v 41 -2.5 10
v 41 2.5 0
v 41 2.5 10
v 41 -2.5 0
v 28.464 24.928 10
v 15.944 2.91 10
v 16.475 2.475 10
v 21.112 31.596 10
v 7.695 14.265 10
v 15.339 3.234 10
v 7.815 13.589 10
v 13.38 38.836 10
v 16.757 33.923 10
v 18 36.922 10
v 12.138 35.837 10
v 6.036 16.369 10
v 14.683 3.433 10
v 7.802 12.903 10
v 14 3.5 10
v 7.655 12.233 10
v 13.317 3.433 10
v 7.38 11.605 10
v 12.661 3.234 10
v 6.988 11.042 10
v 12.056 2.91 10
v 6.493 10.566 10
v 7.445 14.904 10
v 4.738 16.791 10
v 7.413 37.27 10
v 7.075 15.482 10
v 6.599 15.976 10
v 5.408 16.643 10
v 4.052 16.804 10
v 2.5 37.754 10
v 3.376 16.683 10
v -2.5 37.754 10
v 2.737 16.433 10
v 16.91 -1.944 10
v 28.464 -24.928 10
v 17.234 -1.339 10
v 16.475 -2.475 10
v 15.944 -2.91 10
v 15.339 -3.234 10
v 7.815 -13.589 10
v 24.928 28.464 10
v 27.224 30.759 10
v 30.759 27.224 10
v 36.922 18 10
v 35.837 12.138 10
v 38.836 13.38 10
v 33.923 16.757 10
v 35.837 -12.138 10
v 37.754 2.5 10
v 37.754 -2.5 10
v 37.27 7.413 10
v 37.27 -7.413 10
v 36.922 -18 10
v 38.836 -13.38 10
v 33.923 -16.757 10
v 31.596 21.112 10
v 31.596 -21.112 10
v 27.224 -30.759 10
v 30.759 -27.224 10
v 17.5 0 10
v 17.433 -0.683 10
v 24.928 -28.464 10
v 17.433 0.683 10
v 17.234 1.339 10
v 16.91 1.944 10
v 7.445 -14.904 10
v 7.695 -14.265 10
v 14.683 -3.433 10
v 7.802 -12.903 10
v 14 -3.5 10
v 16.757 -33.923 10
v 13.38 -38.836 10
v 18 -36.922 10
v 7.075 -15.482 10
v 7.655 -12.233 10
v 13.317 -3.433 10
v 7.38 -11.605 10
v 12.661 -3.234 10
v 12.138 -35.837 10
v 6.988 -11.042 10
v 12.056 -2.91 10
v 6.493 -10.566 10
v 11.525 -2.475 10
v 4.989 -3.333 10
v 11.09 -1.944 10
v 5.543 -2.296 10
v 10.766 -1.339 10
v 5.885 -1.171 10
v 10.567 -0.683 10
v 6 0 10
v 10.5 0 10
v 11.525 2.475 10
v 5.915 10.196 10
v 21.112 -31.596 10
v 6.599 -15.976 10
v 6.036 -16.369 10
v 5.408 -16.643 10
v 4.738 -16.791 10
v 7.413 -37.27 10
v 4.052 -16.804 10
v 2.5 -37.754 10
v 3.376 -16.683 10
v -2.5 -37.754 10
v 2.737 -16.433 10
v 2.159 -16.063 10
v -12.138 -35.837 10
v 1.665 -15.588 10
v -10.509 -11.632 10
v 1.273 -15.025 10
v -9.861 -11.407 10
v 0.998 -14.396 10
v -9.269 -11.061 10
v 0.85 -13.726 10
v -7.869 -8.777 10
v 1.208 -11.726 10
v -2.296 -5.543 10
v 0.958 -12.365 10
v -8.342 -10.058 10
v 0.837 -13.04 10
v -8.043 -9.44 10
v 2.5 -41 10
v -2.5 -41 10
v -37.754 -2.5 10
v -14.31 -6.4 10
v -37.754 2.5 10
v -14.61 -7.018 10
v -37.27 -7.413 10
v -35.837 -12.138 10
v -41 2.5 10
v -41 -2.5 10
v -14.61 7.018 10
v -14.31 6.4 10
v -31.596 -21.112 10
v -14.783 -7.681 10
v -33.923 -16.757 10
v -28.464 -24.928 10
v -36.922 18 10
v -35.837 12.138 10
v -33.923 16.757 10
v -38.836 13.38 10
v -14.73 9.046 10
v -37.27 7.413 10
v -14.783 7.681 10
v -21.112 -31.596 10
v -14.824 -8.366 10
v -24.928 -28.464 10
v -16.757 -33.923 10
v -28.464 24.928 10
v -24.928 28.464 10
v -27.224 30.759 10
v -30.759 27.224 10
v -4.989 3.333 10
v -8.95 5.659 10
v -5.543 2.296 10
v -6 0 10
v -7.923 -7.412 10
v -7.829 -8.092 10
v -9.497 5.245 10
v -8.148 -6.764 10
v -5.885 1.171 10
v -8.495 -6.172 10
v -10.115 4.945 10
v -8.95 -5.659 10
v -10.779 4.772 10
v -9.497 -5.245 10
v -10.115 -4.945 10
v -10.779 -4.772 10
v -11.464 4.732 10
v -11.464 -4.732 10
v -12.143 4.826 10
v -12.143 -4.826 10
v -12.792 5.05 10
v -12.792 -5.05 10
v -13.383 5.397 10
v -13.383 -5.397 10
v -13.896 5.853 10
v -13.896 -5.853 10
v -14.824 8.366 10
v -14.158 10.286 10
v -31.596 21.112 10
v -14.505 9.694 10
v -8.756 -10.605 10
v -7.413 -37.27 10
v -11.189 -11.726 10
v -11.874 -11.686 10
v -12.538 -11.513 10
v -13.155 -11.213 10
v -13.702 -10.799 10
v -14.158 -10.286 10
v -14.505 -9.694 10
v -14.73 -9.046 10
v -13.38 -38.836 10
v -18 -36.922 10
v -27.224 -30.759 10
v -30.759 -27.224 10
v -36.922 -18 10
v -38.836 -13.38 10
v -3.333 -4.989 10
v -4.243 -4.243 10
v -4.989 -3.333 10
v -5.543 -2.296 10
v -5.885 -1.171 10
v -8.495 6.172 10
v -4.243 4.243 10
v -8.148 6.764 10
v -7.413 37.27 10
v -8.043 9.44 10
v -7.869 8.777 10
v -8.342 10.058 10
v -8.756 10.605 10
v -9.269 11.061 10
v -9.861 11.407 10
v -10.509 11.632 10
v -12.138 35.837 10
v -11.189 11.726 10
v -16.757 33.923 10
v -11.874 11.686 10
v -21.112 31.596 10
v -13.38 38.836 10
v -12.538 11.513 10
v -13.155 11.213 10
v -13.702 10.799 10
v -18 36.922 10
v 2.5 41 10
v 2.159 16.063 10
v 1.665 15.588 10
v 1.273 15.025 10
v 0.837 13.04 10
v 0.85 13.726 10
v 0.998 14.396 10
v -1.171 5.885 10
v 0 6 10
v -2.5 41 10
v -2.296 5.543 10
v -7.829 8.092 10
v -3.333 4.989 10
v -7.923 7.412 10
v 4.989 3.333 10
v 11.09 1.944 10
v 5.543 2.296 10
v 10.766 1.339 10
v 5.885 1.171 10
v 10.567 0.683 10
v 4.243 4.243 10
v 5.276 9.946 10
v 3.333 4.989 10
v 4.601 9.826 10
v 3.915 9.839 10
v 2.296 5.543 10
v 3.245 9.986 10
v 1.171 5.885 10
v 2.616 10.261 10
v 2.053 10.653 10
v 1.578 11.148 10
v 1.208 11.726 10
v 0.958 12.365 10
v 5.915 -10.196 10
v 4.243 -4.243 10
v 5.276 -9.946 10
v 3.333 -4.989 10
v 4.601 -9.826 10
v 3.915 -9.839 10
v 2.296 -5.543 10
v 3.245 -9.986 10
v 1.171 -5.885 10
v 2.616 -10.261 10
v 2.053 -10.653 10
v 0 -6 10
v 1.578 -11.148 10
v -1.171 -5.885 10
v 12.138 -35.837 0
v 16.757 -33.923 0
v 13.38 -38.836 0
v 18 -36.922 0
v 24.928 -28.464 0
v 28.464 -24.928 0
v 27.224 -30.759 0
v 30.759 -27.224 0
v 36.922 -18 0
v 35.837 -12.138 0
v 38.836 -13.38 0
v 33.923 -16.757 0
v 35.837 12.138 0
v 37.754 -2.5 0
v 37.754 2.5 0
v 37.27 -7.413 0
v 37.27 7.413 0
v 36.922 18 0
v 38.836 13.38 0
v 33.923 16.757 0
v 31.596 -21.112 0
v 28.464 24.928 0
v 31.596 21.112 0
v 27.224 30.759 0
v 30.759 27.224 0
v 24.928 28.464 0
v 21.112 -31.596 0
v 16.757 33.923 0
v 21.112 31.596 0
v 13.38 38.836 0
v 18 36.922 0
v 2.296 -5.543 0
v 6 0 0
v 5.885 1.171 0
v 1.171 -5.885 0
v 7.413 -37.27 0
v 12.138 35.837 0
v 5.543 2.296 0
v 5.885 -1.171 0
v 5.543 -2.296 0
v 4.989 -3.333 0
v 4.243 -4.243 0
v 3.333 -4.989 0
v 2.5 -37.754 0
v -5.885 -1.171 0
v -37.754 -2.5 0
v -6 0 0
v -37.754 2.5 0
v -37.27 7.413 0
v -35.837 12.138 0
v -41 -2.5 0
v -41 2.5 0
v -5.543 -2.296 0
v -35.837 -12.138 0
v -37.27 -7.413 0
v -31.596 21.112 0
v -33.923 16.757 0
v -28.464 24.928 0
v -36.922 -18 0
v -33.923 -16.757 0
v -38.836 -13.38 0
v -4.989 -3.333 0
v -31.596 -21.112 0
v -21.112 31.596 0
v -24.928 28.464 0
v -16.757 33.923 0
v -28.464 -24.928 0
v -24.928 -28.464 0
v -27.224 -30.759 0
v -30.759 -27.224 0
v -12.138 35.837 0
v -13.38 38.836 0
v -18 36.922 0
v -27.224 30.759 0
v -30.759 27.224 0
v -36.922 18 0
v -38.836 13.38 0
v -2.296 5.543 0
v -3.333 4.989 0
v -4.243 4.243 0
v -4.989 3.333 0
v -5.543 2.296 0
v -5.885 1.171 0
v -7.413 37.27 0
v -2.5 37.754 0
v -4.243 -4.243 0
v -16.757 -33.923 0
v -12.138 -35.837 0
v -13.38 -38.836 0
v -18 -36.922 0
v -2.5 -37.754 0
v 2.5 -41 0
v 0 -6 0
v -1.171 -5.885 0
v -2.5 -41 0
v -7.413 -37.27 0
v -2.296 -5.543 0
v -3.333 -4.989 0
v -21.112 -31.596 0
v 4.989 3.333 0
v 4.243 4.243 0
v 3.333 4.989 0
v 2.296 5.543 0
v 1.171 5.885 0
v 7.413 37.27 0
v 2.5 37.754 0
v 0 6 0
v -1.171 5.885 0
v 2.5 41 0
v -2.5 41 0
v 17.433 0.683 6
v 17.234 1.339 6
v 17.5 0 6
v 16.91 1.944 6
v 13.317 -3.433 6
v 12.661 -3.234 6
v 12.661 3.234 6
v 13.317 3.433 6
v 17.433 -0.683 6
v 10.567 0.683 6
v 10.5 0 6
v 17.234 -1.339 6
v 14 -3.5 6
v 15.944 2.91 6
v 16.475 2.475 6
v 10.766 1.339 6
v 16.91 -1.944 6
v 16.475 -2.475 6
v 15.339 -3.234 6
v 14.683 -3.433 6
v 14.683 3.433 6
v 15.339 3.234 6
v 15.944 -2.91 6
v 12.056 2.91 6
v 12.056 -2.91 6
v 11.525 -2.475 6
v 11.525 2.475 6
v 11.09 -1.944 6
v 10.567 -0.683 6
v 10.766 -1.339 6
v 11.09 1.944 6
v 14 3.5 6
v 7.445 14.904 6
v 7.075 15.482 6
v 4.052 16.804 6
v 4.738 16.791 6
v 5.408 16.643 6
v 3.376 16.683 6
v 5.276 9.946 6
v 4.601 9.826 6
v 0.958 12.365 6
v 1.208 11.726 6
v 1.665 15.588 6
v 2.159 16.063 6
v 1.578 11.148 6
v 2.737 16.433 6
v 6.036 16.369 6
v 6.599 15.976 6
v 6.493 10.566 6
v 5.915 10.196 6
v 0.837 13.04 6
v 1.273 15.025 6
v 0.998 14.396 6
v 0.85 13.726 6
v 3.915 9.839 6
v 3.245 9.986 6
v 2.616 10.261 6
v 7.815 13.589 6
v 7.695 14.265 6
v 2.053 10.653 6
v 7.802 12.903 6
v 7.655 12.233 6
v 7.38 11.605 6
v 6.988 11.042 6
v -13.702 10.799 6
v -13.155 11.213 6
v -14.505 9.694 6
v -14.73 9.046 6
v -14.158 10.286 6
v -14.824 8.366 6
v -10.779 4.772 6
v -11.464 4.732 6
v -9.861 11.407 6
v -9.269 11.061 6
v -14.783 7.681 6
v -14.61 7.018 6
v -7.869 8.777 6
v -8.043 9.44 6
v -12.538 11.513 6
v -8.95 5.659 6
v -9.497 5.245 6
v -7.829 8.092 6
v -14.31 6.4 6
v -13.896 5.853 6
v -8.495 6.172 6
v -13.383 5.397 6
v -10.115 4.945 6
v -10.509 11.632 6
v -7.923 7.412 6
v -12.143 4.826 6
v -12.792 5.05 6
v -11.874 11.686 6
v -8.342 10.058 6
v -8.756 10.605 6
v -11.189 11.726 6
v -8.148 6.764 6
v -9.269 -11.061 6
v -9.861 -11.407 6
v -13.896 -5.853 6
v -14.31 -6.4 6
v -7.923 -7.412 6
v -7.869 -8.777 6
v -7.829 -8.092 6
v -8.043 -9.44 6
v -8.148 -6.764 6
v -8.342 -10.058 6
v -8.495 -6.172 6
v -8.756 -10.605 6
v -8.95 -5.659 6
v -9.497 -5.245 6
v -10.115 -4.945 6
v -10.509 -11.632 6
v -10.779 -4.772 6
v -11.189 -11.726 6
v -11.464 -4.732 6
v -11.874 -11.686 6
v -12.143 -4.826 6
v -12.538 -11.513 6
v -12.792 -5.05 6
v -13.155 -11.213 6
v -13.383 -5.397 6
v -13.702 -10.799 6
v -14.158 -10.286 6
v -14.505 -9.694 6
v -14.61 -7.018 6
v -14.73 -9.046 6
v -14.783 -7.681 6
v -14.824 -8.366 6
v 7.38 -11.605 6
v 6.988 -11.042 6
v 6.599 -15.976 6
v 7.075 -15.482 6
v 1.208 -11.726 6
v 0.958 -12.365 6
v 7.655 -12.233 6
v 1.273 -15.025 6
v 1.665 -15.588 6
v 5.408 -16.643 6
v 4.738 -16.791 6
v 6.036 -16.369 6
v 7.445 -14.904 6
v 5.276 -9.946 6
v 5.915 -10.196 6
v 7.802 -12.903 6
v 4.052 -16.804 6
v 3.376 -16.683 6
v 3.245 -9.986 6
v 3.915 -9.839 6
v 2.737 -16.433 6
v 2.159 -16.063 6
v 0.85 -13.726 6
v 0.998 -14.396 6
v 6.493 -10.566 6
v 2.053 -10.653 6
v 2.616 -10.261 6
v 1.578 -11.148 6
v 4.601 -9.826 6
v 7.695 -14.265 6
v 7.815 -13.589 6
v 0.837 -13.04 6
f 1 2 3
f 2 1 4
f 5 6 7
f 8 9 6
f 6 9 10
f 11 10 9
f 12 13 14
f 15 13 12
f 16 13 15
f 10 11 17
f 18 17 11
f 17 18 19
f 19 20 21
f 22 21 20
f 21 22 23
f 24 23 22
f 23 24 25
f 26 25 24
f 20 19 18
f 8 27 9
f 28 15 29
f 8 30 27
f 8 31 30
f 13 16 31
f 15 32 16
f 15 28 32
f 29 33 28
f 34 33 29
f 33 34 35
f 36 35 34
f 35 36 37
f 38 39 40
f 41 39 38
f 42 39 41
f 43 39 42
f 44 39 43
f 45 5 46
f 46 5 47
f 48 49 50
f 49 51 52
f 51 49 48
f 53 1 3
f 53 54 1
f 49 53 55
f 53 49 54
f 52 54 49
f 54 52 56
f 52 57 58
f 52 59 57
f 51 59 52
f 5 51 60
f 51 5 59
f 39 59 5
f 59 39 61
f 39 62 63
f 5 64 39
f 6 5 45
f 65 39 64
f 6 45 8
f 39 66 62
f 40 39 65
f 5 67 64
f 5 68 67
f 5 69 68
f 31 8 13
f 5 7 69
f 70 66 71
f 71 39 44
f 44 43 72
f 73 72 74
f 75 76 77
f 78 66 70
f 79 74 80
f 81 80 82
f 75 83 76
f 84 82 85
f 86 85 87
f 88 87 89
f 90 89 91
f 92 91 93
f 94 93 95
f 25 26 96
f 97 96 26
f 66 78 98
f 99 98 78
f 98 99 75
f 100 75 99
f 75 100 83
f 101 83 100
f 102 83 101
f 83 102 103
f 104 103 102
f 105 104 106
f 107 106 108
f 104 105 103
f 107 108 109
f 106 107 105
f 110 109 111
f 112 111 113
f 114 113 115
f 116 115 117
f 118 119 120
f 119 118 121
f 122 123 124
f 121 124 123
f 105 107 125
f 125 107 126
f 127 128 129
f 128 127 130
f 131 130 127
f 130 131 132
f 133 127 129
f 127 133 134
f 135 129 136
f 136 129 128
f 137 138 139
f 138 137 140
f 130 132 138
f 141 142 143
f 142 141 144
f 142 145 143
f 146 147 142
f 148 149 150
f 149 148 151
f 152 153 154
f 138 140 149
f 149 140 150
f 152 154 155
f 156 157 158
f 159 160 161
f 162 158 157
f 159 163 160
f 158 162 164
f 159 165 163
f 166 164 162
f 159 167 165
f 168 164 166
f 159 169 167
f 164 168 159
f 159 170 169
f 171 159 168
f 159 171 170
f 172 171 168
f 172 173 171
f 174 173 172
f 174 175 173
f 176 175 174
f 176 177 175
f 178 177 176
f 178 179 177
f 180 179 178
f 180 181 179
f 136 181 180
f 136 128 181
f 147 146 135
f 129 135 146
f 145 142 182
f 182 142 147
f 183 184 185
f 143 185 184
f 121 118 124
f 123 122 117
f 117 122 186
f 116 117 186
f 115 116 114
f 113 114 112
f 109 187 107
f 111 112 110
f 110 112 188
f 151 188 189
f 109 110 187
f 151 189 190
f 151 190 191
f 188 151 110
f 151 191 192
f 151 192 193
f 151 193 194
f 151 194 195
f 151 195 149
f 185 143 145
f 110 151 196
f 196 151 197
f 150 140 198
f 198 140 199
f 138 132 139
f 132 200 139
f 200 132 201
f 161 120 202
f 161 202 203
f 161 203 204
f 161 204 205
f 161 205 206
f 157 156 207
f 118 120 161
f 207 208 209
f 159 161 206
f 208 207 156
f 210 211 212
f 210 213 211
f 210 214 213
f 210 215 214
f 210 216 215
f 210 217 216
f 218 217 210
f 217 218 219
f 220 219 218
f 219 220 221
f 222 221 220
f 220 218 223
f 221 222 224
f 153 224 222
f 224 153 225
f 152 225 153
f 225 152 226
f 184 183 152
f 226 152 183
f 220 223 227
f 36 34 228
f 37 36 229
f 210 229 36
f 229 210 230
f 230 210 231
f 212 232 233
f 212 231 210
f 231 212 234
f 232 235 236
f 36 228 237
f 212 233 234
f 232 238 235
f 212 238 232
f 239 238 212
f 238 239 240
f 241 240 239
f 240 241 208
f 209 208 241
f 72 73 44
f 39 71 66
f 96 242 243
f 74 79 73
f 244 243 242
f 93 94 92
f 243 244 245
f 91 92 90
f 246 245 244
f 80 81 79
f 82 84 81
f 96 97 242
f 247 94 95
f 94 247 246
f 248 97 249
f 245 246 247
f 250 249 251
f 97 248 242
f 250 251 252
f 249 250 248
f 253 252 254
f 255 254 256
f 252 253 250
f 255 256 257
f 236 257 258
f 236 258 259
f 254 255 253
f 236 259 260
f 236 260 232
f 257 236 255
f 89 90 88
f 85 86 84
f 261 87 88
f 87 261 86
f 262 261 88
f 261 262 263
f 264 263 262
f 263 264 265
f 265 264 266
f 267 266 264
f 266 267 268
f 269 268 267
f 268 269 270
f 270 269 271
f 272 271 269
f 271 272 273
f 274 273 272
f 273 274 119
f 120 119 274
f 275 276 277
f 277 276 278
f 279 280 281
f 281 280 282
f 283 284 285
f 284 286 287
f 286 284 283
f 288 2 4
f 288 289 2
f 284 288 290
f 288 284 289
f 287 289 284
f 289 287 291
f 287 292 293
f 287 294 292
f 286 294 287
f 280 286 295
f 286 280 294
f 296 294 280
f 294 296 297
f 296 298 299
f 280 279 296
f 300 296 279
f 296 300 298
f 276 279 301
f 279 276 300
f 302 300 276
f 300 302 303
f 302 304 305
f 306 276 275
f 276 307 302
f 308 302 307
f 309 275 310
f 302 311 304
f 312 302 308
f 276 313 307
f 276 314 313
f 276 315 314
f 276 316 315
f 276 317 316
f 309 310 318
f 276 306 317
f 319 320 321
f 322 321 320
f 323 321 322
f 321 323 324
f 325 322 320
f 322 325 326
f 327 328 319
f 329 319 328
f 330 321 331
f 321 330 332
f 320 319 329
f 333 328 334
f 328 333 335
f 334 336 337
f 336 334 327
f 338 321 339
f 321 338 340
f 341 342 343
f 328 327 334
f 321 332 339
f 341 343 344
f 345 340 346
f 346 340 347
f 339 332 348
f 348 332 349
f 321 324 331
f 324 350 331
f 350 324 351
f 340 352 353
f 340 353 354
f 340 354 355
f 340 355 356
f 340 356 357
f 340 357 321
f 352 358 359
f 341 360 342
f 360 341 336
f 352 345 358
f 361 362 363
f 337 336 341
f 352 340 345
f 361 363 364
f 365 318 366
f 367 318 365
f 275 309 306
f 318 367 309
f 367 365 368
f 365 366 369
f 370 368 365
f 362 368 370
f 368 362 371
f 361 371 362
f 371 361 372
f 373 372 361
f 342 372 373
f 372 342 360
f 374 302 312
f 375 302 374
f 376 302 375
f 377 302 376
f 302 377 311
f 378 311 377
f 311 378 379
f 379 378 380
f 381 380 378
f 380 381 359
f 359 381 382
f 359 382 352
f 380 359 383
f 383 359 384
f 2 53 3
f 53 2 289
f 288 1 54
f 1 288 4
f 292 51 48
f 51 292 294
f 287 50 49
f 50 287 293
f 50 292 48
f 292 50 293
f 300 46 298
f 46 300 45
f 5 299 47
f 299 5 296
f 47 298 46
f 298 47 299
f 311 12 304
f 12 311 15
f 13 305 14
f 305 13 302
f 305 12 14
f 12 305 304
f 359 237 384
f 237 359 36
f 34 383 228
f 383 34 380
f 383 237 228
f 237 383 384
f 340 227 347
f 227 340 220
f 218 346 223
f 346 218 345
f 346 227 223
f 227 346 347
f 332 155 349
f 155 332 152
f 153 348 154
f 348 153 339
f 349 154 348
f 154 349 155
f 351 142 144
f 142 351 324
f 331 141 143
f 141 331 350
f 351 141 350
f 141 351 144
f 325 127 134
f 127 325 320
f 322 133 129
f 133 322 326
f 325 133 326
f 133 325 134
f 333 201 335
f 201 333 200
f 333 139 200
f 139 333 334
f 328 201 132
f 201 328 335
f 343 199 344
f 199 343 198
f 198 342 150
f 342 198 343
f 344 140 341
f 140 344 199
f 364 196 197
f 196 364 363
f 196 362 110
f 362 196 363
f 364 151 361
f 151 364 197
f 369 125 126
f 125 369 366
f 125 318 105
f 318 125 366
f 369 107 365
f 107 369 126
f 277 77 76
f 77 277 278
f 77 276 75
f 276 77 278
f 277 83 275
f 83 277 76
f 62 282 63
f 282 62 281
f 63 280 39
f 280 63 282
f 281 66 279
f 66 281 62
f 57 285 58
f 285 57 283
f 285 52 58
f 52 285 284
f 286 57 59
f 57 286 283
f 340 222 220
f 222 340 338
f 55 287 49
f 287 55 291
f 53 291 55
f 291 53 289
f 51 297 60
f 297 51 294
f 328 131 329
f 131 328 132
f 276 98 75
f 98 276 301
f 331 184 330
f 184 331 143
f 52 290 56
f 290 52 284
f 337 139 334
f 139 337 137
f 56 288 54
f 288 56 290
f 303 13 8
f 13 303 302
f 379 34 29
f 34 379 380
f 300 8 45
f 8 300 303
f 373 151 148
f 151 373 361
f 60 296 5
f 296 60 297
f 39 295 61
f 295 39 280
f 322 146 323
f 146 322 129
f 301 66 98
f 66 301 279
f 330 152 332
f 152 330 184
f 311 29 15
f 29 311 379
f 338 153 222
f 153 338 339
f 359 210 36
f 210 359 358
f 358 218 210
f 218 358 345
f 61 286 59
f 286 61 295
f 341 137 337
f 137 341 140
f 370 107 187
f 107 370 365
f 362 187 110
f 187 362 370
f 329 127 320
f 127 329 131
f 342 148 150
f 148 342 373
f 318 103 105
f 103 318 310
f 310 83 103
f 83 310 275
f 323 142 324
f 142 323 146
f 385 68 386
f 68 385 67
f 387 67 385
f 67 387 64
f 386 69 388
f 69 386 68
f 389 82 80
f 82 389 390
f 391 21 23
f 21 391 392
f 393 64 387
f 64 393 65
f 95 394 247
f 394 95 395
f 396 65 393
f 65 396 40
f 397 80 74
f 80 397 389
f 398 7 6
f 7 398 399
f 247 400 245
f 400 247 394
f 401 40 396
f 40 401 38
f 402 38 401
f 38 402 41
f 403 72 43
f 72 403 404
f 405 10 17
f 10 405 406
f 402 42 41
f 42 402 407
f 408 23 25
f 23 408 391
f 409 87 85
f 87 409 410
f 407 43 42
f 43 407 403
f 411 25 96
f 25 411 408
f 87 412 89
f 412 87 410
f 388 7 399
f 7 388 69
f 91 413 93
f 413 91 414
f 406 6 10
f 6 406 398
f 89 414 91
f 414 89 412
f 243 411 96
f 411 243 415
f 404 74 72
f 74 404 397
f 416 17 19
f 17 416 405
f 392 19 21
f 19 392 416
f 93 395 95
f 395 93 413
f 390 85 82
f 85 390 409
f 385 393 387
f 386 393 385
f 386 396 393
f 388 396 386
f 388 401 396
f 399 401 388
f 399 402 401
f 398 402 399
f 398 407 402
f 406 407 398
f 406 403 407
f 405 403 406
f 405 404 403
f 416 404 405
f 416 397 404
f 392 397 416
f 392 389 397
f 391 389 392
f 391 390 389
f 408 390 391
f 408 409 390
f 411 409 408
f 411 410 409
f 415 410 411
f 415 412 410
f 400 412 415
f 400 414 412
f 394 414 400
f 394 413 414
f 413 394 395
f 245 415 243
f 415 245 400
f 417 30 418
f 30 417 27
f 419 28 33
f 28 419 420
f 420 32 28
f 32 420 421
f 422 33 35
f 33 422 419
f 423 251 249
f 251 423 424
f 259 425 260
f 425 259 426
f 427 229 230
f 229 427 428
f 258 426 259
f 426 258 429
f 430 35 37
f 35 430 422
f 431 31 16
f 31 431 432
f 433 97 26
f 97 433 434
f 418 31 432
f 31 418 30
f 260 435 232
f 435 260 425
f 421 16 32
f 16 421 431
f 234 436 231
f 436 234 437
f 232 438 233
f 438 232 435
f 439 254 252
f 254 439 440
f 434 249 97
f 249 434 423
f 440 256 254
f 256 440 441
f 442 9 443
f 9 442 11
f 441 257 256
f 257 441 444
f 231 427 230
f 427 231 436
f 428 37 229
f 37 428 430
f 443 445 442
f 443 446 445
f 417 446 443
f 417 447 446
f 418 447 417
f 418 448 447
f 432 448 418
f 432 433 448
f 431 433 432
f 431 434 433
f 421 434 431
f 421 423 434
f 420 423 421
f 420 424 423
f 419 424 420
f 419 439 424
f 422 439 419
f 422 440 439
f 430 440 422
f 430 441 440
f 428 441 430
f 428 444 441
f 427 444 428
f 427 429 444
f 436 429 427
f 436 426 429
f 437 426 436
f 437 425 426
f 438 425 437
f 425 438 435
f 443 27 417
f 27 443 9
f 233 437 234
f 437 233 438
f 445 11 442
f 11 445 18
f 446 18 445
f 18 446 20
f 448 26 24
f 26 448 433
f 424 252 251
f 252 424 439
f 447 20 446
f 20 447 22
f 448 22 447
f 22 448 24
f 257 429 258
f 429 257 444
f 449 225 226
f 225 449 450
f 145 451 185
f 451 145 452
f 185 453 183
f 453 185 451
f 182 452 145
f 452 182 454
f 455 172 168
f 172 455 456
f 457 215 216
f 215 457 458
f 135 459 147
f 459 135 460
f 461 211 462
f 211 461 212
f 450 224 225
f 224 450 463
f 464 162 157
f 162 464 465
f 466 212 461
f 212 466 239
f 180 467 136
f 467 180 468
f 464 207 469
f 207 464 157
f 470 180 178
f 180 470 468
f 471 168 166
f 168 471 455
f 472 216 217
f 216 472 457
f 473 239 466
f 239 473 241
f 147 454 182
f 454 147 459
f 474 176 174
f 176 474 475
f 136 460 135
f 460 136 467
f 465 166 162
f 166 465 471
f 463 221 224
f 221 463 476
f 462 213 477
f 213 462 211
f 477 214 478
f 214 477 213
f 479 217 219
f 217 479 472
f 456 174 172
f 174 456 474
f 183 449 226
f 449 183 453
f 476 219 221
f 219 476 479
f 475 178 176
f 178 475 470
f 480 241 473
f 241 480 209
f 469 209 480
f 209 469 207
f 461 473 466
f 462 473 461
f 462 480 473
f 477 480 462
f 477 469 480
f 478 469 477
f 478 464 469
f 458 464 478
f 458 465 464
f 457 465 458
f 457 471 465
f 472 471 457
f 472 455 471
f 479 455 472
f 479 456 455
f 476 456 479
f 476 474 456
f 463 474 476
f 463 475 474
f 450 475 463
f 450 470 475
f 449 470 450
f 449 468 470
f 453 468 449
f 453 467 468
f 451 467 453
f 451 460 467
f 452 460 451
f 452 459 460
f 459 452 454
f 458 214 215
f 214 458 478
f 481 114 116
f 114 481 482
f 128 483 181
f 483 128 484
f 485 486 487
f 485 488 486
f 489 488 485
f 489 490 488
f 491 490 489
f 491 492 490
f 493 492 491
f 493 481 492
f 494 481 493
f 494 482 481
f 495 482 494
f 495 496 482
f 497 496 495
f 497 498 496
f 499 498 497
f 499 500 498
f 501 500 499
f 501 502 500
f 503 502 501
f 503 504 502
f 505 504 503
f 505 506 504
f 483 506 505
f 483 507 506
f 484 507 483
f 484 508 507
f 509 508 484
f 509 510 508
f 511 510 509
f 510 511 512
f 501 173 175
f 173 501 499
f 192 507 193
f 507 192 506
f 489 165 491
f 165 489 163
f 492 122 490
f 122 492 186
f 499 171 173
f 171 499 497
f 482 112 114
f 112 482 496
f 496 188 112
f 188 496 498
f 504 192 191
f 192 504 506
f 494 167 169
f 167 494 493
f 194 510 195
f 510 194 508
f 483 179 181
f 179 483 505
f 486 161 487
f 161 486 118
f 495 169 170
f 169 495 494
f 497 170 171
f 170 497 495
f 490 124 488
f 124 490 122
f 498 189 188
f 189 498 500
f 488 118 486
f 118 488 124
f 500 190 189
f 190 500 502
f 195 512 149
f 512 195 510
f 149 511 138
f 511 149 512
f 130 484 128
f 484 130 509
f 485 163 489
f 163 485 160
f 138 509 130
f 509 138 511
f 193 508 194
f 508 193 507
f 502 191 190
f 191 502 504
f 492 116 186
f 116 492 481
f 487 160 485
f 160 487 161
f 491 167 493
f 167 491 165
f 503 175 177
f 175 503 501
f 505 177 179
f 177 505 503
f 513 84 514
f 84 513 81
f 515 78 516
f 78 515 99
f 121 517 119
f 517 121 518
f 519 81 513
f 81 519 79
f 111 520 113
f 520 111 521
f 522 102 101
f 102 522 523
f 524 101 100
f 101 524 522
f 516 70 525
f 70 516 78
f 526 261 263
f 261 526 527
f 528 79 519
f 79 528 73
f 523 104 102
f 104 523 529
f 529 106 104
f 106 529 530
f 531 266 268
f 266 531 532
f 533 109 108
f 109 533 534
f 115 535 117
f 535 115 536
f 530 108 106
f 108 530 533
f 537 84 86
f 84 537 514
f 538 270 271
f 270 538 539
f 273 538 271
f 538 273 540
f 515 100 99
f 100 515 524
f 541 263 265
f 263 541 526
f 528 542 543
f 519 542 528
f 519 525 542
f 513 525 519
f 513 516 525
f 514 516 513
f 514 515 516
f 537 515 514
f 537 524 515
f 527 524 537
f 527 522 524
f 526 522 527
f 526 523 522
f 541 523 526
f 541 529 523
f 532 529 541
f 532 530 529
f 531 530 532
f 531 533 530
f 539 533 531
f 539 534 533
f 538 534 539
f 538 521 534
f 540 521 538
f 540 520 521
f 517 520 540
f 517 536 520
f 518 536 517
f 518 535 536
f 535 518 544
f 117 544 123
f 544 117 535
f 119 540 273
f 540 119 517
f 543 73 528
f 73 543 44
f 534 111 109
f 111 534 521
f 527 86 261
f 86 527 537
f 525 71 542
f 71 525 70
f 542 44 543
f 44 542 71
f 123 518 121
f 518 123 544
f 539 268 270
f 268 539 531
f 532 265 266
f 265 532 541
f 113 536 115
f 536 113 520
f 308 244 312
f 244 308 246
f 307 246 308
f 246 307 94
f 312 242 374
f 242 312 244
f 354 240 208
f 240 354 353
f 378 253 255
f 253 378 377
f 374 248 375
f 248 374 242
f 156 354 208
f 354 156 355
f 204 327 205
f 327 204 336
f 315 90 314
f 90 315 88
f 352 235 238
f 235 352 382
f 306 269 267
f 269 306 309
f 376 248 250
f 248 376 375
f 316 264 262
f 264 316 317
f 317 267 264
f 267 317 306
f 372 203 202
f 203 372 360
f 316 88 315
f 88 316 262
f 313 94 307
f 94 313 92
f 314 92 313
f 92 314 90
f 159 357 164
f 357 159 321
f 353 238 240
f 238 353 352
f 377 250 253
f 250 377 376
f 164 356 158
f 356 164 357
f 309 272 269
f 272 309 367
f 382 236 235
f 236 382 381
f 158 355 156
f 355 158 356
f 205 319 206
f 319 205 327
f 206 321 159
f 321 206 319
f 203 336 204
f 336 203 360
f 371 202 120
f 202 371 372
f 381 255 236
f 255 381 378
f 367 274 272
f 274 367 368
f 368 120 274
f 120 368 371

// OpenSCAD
$fn = 32;

// ----------------------------------------------------------------------
// Spur blank: lightened gear blank
// ----------------------------------------------------------------------

// --- parameters (mm) ---
disc_r = 38;              // blank root radius
disc_t = 10;              // blank thickness
n_teeth = 16;             // stub tooth count
tooth_w = 5;              // tooth width at the root
tooth_h = 3;              // tooth height above the root
bore_r = 6;               // central bore radius
ring_r = 14;              // lightening pocket ring radius
pocket_r = 3.5;           // lightening pocket radius

out_r = disc_r + tooth_h;  // tip radius
bbox_x = 82.0;  // measured width over the teeth
bbox_y = 82.0;  // measured depth over the teeth

difference() {
union() {
  cylinder(r = disc_r, h = disc_t);
  for (i = [0 : n_teeth - 1])
    rotate([0, 0, i * 360 / n_teeth])
      translate([disc_r - 1, -tooth_w / 2, 0])
        cube([tooth_h + 1, tooth_w, disc_t]);
}
  translate([0, 0, -1]) cylinder(r = bore_r, h = disc_t + 2);
  for (i = [0 : 5])
    rotate([0, 0, i * 72])
      translate([ring_r, 0, disc_t - 4])
        cylinder(r = pocket_r, h = 5);
}
